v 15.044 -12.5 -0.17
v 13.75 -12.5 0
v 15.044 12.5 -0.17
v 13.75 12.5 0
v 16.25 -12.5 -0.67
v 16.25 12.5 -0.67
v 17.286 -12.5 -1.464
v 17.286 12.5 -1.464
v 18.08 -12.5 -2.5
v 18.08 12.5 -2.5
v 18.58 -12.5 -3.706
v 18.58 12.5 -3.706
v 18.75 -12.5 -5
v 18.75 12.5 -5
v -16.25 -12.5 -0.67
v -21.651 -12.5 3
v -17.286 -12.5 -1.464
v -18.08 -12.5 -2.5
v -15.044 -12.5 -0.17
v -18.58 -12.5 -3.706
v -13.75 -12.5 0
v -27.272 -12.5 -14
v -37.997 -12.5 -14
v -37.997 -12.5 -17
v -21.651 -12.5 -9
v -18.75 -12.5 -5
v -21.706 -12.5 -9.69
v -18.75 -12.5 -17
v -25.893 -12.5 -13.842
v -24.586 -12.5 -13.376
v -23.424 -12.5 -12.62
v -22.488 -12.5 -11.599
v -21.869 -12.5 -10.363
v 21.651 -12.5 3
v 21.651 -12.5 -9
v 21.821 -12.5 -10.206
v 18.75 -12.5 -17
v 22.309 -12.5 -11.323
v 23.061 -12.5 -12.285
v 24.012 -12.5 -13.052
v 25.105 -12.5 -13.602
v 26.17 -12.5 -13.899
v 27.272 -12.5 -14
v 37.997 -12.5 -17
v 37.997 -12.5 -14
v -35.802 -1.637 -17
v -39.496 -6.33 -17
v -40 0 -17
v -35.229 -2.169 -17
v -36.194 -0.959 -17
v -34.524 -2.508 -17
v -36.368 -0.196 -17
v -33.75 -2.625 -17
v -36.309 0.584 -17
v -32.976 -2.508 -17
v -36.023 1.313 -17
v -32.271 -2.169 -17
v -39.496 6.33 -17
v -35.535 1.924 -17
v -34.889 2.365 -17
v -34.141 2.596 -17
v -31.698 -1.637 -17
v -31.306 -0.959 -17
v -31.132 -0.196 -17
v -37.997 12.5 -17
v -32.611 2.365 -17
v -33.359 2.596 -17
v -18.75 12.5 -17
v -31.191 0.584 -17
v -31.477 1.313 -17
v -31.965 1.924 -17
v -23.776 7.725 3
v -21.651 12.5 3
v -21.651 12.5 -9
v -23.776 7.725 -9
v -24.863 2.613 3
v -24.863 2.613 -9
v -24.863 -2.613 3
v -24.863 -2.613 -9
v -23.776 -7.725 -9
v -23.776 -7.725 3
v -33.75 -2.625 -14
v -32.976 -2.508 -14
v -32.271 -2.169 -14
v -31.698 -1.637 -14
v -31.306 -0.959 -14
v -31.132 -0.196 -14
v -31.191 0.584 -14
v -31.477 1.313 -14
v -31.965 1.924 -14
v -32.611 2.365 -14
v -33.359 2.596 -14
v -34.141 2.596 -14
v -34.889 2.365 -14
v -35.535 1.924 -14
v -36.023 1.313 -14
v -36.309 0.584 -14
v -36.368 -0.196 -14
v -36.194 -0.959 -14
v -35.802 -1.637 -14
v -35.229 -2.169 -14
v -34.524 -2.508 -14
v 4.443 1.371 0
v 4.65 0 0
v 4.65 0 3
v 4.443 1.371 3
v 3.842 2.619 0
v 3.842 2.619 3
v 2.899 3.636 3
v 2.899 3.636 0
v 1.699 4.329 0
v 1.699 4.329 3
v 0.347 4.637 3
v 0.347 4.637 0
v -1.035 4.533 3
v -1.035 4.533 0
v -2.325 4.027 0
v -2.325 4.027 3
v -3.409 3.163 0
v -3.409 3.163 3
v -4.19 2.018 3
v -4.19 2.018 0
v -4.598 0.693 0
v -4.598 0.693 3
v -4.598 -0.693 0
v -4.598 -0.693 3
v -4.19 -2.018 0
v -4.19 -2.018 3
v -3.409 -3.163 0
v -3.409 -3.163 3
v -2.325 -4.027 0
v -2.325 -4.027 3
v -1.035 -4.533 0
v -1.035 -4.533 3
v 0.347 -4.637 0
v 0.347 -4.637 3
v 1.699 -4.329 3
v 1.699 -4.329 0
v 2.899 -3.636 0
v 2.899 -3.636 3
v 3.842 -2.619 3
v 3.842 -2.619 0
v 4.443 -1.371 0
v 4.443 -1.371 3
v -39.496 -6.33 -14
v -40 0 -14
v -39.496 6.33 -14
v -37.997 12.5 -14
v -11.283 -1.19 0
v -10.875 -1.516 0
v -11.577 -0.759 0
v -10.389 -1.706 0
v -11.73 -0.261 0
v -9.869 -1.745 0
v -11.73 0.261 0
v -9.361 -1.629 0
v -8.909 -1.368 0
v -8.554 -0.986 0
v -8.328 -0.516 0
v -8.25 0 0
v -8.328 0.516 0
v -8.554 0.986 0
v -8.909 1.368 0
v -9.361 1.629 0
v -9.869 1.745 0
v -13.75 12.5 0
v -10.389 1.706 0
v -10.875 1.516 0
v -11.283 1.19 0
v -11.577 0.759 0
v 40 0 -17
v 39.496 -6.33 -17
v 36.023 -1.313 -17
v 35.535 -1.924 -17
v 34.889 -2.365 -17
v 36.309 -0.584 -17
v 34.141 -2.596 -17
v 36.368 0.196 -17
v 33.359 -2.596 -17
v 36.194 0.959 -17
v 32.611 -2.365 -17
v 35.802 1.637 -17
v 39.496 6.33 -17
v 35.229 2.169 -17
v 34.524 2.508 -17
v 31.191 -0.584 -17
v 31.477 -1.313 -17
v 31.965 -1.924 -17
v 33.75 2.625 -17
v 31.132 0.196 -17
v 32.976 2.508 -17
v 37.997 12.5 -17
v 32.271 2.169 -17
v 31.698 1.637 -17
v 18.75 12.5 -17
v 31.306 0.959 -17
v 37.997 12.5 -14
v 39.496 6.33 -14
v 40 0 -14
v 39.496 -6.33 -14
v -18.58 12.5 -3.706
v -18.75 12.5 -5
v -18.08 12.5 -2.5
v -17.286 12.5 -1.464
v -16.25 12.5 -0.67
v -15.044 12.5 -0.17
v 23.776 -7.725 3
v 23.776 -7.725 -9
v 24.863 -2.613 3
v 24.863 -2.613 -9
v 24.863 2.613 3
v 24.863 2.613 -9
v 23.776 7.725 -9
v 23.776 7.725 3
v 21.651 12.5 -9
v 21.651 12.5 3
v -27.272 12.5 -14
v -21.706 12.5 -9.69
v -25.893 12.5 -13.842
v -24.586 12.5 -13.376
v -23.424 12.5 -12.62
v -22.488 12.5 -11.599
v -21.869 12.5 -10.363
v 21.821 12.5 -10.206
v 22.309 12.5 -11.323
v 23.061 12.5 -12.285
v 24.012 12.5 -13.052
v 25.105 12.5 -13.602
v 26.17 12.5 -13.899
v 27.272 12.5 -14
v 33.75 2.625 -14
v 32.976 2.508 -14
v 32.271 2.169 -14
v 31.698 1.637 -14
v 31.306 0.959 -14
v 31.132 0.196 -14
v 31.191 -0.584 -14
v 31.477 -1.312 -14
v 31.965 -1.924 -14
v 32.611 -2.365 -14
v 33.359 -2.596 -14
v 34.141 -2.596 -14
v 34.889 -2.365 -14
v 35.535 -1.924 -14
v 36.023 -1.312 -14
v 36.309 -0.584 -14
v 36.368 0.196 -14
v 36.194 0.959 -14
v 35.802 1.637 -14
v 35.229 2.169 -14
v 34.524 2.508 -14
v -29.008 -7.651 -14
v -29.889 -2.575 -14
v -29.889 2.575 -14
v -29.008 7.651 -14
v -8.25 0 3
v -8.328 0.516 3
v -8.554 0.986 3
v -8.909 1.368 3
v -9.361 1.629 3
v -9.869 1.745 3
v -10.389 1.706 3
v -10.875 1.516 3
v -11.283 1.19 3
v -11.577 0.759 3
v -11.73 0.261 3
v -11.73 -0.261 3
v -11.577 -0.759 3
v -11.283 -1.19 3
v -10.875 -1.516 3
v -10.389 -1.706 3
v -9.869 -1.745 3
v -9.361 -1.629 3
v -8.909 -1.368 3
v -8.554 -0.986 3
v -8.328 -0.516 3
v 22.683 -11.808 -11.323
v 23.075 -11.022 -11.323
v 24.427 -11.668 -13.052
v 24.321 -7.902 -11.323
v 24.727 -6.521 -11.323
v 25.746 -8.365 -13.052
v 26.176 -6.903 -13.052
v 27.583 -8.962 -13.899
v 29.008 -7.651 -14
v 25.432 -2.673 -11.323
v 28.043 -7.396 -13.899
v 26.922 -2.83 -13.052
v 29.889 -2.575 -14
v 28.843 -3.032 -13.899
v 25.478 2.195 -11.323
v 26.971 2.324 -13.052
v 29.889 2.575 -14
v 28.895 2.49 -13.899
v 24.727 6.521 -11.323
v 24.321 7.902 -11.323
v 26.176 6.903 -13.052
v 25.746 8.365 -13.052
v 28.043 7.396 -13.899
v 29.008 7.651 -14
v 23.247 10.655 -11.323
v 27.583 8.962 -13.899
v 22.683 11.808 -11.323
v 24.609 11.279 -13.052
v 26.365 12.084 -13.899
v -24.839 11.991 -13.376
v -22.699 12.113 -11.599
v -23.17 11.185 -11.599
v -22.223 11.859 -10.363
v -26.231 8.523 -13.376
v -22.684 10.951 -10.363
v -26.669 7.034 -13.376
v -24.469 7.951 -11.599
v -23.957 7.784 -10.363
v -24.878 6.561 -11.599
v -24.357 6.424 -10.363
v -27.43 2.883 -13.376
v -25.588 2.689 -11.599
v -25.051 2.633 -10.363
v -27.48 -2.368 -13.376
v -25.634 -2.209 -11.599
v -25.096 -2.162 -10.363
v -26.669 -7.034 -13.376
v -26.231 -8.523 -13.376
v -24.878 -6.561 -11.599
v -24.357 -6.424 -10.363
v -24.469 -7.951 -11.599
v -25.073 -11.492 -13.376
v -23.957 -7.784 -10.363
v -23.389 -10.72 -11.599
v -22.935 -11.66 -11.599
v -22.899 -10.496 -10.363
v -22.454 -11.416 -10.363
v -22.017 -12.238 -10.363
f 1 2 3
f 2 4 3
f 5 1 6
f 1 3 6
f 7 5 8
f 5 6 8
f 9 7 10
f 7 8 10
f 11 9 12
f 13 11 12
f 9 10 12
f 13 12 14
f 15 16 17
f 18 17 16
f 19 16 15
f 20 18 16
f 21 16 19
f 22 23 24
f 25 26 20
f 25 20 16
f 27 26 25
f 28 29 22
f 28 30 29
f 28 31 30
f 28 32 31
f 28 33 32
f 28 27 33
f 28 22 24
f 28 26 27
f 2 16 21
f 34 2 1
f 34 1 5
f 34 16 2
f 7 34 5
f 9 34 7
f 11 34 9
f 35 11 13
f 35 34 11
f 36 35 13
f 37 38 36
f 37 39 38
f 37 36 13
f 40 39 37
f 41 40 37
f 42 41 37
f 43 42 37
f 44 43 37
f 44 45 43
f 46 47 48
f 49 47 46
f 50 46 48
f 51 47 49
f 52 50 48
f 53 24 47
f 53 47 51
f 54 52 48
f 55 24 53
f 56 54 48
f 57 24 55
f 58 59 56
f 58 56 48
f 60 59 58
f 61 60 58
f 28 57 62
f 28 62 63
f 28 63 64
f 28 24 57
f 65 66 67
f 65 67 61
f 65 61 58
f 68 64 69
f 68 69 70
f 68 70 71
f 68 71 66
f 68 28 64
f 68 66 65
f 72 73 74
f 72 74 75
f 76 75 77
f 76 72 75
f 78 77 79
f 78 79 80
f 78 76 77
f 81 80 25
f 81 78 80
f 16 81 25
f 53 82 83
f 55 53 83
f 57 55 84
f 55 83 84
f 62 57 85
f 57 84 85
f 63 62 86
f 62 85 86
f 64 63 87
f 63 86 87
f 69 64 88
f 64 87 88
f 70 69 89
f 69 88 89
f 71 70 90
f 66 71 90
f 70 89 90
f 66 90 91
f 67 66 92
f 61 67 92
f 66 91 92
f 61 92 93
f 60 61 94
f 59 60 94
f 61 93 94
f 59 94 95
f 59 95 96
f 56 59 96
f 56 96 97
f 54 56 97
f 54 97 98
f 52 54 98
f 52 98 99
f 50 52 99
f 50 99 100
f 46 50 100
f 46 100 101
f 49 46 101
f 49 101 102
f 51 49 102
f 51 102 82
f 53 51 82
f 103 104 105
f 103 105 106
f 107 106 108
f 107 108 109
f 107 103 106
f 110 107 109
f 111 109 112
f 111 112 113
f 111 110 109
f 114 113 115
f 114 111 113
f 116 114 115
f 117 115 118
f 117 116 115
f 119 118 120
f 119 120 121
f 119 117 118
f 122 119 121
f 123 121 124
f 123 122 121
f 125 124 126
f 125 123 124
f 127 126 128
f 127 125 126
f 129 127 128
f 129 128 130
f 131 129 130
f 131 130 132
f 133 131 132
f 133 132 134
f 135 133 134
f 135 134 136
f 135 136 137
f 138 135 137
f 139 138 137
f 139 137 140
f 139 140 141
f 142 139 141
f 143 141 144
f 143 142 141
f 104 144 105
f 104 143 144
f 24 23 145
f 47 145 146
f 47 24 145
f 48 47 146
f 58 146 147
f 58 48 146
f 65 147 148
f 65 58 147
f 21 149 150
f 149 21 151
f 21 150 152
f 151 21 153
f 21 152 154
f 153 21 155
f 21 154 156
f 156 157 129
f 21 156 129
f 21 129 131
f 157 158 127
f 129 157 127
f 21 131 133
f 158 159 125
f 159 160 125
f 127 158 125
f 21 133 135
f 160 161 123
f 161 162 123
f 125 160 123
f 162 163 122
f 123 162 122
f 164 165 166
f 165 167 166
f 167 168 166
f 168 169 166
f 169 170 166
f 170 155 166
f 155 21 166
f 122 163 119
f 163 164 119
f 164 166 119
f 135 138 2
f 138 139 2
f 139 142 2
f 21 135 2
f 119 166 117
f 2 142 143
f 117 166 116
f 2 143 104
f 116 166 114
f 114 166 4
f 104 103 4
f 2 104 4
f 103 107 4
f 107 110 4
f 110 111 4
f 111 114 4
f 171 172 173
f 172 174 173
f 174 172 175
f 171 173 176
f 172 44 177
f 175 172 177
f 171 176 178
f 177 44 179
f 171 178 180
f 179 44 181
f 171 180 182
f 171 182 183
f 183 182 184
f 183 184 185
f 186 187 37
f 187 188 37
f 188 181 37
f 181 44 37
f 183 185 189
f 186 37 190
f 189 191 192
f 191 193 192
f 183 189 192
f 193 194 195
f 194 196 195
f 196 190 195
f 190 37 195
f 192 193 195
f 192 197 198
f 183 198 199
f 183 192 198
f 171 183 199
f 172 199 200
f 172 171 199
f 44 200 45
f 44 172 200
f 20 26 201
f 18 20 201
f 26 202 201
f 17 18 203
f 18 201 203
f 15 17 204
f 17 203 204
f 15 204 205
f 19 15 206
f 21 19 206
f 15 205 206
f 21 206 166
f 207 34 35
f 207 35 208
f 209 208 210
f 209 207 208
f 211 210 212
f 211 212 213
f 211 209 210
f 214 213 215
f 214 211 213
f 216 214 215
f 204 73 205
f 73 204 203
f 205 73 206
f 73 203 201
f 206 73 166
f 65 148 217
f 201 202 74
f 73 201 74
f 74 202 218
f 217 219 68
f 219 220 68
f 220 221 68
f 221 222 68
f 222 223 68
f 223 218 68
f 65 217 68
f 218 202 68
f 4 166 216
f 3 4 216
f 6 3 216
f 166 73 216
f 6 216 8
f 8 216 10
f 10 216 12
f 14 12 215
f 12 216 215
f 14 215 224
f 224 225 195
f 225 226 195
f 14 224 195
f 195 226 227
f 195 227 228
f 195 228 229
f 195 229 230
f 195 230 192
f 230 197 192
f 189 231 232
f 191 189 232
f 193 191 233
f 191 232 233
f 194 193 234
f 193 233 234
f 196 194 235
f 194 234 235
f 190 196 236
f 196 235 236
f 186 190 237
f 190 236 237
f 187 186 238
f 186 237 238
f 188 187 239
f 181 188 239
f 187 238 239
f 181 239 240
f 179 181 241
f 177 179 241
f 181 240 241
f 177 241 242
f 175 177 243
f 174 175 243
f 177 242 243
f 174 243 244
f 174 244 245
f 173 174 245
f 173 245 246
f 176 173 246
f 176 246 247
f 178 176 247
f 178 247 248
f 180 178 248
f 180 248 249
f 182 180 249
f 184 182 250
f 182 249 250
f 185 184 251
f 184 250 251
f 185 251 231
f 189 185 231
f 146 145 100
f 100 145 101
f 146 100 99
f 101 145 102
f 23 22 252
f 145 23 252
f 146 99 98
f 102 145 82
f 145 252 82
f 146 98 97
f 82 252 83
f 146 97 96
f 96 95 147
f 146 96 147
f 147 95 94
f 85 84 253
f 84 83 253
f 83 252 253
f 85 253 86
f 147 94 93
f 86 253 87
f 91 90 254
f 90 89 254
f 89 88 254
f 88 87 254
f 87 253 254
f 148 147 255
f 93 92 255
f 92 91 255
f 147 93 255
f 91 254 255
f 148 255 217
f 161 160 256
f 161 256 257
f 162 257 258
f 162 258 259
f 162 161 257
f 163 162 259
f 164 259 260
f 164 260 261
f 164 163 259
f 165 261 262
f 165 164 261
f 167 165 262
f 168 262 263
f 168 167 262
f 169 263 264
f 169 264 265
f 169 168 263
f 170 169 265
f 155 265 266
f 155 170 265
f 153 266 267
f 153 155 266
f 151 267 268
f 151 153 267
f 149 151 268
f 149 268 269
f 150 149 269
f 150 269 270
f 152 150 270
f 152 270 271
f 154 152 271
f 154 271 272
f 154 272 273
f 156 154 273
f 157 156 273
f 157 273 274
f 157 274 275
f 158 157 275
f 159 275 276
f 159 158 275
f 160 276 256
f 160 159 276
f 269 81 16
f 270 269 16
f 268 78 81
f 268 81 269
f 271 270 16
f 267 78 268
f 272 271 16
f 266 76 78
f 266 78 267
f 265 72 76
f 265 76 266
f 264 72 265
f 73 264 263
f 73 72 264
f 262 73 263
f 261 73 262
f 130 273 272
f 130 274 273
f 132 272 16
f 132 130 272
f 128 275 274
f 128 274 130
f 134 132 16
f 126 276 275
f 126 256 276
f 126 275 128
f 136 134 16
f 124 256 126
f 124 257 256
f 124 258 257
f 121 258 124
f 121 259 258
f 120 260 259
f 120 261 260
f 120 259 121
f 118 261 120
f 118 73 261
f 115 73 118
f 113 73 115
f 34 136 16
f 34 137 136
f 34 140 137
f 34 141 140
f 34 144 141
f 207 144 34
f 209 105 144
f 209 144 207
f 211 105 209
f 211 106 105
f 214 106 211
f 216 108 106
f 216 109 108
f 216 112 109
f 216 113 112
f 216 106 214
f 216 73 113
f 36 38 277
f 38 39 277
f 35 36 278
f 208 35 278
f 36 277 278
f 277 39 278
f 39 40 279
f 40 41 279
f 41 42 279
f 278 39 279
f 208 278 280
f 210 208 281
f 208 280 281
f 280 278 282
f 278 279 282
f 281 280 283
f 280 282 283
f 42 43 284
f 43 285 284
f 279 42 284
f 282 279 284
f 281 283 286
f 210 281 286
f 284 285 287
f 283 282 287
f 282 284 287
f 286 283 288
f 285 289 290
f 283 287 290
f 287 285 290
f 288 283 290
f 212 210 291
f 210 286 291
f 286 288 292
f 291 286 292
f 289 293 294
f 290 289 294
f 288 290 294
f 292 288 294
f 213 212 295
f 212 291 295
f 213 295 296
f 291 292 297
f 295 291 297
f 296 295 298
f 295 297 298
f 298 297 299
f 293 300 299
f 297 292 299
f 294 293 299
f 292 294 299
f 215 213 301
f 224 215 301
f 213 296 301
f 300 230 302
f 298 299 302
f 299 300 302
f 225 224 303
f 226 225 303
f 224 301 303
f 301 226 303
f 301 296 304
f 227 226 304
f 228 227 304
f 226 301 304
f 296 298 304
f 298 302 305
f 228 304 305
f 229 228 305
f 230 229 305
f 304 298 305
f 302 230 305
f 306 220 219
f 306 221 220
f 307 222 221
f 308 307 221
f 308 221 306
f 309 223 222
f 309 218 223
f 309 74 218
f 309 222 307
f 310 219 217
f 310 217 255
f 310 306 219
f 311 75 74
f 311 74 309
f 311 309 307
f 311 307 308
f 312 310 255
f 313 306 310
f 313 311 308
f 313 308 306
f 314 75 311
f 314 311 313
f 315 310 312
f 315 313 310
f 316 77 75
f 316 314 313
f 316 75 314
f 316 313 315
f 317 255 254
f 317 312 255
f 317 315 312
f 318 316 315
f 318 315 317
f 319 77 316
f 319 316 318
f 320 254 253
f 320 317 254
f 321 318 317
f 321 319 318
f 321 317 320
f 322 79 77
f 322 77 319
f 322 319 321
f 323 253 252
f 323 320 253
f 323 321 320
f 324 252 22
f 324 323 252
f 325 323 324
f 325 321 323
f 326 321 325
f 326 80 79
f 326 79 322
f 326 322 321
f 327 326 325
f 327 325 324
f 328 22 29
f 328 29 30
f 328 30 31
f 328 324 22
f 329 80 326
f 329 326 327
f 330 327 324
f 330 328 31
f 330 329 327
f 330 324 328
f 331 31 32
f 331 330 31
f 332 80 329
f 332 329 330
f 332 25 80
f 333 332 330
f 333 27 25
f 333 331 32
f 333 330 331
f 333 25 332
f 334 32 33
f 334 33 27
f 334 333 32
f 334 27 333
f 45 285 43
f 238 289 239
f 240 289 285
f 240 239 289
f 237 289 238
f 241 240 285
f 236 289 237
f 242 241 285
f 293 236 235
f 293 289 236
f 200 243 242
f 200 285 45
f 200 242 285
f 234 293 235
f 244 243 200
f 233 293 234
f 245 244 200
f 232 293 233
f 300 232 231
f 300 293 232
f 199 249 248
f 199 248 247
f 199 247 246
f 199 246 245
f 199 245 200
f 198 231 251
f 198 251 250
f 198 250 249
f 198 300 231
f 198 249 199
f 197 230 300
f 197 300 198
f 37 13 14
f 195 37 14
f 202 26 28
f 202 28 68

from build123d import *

# Parameters (mm, degrees)
SKETCH1_W           = 57.5
SKETCH1_H           = 25
SKETCH1_R           = 4.65
SKETCH1_R_2         = 1.75
BOSS_EXTRUDE1_DEPTH = 3
SKETCH2_W           = 10
SKETCH2_H           = 25
BOSS_EXTRUDE2_DEPTH = 17
SKETCH4_W           = 3
SKETCH4_H           = 25
BOSS_EXTRUDE3_DEPTH = 15
SKETCH8_R           = 69.668681809
SKETCH8_R_2         = 40
CUT_EXTRUDE3_DEPTH  = 40
SKETCH9_R           = 2.625
CUT_EXTRUDE4_DEPTH  = 5
SKETCH11_R          = 34.641133141
SKETCH11_R_2        = 25
CUT_EXTRUDE5_DEPTH  = 17
FILLET1_R           = 5


with BuildPart() as part:
    # Sketch1 → Boss-Extrude1 (new body)
    with BuildSketch(Plane.XY):
        Rectangle(SKETCH1_W, SKETCH1_H)
        Circle(SKETCH1_R, mode=Mode.SUBTRACT)
        with Locations((-10, 0)):
            Circle(SKETCH1_R_2, mode=Mode.SUBTRACT)
    extrude(amount=BOSS_EXTRUDE1_DEPTH)

    # Sketch2 → Boss-Extrude2 (add)
    with BuildSketch(Plane(origin=(0, 0, 0), x_dir=(-1, 0, 0), z_dir=(0, 0, -1))):
        with Locations((-23.75, 0)):
            Rectangle(SKETCH2_W, SKETCH2_H)
    boss_extrude2 = extrude(amount=BOSS_EXTRUDE2_DEPTH)

    # Sketch4 → Boss-Extrude3 (add)
    with BuildSketch(Plane(origin=(28.75, 0, 0), x_dir=(0, 0, -1), z_dir=(1, 0, 0))):
        with Locations((15.5, 0)):
            Rectangle(SKETCH4_W, SKETCH4_H)
    boss_extrude3 = extrude(amount=BOSS_EXTRUDE3_DEPTH)

    # Mirror2: Boss-Extrude2 across plane
    add(boss_extrude2.mirror(Plane(origin=(0, 0, 0), x_dir=(0, 0, 1), z_dir=(1, 0, 0))))

    # Mirror3: Boss-Extrude3 across plane
    add(boss_extrude3.mirror(Plane(origin=(0, 0, 0), x_dir=(0, 0, 1), z_dir=(1, 0, 0))))

    # Sketch8 → Cut-Extrude3 (cut)
    with BuildSketch(Plane(origin=(0, 0, -17), x_dir=(-1, 0, 0), z_dir=(0, 0, -1))):
        Circle(SKETCH8_R)
        Circle(SKETCH8_R_2, mode=Mode.SUBTRACT)
    extrude(amount=-CUT_EXTRUDE3_DEPTH, mode=Mode.SUBTRACT)

    # Sketch9 → Cut-Extrude4 (cut, symmetric)
    with BuildSketch(Plane.XY.offset(-14)):
        with Locations(Location((-33.75, 0, 0), (0, 0, 270))):
            Circle(SKETCH9_R)
        with Locations(Location((33.75, 0, 0), (0, 0, 90))):
            Circle(SKETCH9_R)
    extrude(amount=CUT_EXTRUDE4_DEPTH, both=True, mode=Mode.SUBTRACT)

    # Sketch11 → Cut-Extrude5 (cut)
    with BuildSketch(Plane.XY.offset(3)):
        Circle(SKETCH11_R)
        Circle(SKETCH11_R_2, mode=Mode.SUBTRACT)
    extrude(amount=-CUT_EXTRUDE5_DEPTH, mode=Mode.SUBTRACT)

    # Fillet1
    fillet1_edges = [part.edges().sort_by_distance(p)[0] for p in [
        (-25, 0, -14),
        (25, 0, -14),
        (18.75, 0, 0),
        (-18.75, 0, 0),
    ]]
    fillet(fillet1_edges, radius=FILLET1_R)


solid = part.part
